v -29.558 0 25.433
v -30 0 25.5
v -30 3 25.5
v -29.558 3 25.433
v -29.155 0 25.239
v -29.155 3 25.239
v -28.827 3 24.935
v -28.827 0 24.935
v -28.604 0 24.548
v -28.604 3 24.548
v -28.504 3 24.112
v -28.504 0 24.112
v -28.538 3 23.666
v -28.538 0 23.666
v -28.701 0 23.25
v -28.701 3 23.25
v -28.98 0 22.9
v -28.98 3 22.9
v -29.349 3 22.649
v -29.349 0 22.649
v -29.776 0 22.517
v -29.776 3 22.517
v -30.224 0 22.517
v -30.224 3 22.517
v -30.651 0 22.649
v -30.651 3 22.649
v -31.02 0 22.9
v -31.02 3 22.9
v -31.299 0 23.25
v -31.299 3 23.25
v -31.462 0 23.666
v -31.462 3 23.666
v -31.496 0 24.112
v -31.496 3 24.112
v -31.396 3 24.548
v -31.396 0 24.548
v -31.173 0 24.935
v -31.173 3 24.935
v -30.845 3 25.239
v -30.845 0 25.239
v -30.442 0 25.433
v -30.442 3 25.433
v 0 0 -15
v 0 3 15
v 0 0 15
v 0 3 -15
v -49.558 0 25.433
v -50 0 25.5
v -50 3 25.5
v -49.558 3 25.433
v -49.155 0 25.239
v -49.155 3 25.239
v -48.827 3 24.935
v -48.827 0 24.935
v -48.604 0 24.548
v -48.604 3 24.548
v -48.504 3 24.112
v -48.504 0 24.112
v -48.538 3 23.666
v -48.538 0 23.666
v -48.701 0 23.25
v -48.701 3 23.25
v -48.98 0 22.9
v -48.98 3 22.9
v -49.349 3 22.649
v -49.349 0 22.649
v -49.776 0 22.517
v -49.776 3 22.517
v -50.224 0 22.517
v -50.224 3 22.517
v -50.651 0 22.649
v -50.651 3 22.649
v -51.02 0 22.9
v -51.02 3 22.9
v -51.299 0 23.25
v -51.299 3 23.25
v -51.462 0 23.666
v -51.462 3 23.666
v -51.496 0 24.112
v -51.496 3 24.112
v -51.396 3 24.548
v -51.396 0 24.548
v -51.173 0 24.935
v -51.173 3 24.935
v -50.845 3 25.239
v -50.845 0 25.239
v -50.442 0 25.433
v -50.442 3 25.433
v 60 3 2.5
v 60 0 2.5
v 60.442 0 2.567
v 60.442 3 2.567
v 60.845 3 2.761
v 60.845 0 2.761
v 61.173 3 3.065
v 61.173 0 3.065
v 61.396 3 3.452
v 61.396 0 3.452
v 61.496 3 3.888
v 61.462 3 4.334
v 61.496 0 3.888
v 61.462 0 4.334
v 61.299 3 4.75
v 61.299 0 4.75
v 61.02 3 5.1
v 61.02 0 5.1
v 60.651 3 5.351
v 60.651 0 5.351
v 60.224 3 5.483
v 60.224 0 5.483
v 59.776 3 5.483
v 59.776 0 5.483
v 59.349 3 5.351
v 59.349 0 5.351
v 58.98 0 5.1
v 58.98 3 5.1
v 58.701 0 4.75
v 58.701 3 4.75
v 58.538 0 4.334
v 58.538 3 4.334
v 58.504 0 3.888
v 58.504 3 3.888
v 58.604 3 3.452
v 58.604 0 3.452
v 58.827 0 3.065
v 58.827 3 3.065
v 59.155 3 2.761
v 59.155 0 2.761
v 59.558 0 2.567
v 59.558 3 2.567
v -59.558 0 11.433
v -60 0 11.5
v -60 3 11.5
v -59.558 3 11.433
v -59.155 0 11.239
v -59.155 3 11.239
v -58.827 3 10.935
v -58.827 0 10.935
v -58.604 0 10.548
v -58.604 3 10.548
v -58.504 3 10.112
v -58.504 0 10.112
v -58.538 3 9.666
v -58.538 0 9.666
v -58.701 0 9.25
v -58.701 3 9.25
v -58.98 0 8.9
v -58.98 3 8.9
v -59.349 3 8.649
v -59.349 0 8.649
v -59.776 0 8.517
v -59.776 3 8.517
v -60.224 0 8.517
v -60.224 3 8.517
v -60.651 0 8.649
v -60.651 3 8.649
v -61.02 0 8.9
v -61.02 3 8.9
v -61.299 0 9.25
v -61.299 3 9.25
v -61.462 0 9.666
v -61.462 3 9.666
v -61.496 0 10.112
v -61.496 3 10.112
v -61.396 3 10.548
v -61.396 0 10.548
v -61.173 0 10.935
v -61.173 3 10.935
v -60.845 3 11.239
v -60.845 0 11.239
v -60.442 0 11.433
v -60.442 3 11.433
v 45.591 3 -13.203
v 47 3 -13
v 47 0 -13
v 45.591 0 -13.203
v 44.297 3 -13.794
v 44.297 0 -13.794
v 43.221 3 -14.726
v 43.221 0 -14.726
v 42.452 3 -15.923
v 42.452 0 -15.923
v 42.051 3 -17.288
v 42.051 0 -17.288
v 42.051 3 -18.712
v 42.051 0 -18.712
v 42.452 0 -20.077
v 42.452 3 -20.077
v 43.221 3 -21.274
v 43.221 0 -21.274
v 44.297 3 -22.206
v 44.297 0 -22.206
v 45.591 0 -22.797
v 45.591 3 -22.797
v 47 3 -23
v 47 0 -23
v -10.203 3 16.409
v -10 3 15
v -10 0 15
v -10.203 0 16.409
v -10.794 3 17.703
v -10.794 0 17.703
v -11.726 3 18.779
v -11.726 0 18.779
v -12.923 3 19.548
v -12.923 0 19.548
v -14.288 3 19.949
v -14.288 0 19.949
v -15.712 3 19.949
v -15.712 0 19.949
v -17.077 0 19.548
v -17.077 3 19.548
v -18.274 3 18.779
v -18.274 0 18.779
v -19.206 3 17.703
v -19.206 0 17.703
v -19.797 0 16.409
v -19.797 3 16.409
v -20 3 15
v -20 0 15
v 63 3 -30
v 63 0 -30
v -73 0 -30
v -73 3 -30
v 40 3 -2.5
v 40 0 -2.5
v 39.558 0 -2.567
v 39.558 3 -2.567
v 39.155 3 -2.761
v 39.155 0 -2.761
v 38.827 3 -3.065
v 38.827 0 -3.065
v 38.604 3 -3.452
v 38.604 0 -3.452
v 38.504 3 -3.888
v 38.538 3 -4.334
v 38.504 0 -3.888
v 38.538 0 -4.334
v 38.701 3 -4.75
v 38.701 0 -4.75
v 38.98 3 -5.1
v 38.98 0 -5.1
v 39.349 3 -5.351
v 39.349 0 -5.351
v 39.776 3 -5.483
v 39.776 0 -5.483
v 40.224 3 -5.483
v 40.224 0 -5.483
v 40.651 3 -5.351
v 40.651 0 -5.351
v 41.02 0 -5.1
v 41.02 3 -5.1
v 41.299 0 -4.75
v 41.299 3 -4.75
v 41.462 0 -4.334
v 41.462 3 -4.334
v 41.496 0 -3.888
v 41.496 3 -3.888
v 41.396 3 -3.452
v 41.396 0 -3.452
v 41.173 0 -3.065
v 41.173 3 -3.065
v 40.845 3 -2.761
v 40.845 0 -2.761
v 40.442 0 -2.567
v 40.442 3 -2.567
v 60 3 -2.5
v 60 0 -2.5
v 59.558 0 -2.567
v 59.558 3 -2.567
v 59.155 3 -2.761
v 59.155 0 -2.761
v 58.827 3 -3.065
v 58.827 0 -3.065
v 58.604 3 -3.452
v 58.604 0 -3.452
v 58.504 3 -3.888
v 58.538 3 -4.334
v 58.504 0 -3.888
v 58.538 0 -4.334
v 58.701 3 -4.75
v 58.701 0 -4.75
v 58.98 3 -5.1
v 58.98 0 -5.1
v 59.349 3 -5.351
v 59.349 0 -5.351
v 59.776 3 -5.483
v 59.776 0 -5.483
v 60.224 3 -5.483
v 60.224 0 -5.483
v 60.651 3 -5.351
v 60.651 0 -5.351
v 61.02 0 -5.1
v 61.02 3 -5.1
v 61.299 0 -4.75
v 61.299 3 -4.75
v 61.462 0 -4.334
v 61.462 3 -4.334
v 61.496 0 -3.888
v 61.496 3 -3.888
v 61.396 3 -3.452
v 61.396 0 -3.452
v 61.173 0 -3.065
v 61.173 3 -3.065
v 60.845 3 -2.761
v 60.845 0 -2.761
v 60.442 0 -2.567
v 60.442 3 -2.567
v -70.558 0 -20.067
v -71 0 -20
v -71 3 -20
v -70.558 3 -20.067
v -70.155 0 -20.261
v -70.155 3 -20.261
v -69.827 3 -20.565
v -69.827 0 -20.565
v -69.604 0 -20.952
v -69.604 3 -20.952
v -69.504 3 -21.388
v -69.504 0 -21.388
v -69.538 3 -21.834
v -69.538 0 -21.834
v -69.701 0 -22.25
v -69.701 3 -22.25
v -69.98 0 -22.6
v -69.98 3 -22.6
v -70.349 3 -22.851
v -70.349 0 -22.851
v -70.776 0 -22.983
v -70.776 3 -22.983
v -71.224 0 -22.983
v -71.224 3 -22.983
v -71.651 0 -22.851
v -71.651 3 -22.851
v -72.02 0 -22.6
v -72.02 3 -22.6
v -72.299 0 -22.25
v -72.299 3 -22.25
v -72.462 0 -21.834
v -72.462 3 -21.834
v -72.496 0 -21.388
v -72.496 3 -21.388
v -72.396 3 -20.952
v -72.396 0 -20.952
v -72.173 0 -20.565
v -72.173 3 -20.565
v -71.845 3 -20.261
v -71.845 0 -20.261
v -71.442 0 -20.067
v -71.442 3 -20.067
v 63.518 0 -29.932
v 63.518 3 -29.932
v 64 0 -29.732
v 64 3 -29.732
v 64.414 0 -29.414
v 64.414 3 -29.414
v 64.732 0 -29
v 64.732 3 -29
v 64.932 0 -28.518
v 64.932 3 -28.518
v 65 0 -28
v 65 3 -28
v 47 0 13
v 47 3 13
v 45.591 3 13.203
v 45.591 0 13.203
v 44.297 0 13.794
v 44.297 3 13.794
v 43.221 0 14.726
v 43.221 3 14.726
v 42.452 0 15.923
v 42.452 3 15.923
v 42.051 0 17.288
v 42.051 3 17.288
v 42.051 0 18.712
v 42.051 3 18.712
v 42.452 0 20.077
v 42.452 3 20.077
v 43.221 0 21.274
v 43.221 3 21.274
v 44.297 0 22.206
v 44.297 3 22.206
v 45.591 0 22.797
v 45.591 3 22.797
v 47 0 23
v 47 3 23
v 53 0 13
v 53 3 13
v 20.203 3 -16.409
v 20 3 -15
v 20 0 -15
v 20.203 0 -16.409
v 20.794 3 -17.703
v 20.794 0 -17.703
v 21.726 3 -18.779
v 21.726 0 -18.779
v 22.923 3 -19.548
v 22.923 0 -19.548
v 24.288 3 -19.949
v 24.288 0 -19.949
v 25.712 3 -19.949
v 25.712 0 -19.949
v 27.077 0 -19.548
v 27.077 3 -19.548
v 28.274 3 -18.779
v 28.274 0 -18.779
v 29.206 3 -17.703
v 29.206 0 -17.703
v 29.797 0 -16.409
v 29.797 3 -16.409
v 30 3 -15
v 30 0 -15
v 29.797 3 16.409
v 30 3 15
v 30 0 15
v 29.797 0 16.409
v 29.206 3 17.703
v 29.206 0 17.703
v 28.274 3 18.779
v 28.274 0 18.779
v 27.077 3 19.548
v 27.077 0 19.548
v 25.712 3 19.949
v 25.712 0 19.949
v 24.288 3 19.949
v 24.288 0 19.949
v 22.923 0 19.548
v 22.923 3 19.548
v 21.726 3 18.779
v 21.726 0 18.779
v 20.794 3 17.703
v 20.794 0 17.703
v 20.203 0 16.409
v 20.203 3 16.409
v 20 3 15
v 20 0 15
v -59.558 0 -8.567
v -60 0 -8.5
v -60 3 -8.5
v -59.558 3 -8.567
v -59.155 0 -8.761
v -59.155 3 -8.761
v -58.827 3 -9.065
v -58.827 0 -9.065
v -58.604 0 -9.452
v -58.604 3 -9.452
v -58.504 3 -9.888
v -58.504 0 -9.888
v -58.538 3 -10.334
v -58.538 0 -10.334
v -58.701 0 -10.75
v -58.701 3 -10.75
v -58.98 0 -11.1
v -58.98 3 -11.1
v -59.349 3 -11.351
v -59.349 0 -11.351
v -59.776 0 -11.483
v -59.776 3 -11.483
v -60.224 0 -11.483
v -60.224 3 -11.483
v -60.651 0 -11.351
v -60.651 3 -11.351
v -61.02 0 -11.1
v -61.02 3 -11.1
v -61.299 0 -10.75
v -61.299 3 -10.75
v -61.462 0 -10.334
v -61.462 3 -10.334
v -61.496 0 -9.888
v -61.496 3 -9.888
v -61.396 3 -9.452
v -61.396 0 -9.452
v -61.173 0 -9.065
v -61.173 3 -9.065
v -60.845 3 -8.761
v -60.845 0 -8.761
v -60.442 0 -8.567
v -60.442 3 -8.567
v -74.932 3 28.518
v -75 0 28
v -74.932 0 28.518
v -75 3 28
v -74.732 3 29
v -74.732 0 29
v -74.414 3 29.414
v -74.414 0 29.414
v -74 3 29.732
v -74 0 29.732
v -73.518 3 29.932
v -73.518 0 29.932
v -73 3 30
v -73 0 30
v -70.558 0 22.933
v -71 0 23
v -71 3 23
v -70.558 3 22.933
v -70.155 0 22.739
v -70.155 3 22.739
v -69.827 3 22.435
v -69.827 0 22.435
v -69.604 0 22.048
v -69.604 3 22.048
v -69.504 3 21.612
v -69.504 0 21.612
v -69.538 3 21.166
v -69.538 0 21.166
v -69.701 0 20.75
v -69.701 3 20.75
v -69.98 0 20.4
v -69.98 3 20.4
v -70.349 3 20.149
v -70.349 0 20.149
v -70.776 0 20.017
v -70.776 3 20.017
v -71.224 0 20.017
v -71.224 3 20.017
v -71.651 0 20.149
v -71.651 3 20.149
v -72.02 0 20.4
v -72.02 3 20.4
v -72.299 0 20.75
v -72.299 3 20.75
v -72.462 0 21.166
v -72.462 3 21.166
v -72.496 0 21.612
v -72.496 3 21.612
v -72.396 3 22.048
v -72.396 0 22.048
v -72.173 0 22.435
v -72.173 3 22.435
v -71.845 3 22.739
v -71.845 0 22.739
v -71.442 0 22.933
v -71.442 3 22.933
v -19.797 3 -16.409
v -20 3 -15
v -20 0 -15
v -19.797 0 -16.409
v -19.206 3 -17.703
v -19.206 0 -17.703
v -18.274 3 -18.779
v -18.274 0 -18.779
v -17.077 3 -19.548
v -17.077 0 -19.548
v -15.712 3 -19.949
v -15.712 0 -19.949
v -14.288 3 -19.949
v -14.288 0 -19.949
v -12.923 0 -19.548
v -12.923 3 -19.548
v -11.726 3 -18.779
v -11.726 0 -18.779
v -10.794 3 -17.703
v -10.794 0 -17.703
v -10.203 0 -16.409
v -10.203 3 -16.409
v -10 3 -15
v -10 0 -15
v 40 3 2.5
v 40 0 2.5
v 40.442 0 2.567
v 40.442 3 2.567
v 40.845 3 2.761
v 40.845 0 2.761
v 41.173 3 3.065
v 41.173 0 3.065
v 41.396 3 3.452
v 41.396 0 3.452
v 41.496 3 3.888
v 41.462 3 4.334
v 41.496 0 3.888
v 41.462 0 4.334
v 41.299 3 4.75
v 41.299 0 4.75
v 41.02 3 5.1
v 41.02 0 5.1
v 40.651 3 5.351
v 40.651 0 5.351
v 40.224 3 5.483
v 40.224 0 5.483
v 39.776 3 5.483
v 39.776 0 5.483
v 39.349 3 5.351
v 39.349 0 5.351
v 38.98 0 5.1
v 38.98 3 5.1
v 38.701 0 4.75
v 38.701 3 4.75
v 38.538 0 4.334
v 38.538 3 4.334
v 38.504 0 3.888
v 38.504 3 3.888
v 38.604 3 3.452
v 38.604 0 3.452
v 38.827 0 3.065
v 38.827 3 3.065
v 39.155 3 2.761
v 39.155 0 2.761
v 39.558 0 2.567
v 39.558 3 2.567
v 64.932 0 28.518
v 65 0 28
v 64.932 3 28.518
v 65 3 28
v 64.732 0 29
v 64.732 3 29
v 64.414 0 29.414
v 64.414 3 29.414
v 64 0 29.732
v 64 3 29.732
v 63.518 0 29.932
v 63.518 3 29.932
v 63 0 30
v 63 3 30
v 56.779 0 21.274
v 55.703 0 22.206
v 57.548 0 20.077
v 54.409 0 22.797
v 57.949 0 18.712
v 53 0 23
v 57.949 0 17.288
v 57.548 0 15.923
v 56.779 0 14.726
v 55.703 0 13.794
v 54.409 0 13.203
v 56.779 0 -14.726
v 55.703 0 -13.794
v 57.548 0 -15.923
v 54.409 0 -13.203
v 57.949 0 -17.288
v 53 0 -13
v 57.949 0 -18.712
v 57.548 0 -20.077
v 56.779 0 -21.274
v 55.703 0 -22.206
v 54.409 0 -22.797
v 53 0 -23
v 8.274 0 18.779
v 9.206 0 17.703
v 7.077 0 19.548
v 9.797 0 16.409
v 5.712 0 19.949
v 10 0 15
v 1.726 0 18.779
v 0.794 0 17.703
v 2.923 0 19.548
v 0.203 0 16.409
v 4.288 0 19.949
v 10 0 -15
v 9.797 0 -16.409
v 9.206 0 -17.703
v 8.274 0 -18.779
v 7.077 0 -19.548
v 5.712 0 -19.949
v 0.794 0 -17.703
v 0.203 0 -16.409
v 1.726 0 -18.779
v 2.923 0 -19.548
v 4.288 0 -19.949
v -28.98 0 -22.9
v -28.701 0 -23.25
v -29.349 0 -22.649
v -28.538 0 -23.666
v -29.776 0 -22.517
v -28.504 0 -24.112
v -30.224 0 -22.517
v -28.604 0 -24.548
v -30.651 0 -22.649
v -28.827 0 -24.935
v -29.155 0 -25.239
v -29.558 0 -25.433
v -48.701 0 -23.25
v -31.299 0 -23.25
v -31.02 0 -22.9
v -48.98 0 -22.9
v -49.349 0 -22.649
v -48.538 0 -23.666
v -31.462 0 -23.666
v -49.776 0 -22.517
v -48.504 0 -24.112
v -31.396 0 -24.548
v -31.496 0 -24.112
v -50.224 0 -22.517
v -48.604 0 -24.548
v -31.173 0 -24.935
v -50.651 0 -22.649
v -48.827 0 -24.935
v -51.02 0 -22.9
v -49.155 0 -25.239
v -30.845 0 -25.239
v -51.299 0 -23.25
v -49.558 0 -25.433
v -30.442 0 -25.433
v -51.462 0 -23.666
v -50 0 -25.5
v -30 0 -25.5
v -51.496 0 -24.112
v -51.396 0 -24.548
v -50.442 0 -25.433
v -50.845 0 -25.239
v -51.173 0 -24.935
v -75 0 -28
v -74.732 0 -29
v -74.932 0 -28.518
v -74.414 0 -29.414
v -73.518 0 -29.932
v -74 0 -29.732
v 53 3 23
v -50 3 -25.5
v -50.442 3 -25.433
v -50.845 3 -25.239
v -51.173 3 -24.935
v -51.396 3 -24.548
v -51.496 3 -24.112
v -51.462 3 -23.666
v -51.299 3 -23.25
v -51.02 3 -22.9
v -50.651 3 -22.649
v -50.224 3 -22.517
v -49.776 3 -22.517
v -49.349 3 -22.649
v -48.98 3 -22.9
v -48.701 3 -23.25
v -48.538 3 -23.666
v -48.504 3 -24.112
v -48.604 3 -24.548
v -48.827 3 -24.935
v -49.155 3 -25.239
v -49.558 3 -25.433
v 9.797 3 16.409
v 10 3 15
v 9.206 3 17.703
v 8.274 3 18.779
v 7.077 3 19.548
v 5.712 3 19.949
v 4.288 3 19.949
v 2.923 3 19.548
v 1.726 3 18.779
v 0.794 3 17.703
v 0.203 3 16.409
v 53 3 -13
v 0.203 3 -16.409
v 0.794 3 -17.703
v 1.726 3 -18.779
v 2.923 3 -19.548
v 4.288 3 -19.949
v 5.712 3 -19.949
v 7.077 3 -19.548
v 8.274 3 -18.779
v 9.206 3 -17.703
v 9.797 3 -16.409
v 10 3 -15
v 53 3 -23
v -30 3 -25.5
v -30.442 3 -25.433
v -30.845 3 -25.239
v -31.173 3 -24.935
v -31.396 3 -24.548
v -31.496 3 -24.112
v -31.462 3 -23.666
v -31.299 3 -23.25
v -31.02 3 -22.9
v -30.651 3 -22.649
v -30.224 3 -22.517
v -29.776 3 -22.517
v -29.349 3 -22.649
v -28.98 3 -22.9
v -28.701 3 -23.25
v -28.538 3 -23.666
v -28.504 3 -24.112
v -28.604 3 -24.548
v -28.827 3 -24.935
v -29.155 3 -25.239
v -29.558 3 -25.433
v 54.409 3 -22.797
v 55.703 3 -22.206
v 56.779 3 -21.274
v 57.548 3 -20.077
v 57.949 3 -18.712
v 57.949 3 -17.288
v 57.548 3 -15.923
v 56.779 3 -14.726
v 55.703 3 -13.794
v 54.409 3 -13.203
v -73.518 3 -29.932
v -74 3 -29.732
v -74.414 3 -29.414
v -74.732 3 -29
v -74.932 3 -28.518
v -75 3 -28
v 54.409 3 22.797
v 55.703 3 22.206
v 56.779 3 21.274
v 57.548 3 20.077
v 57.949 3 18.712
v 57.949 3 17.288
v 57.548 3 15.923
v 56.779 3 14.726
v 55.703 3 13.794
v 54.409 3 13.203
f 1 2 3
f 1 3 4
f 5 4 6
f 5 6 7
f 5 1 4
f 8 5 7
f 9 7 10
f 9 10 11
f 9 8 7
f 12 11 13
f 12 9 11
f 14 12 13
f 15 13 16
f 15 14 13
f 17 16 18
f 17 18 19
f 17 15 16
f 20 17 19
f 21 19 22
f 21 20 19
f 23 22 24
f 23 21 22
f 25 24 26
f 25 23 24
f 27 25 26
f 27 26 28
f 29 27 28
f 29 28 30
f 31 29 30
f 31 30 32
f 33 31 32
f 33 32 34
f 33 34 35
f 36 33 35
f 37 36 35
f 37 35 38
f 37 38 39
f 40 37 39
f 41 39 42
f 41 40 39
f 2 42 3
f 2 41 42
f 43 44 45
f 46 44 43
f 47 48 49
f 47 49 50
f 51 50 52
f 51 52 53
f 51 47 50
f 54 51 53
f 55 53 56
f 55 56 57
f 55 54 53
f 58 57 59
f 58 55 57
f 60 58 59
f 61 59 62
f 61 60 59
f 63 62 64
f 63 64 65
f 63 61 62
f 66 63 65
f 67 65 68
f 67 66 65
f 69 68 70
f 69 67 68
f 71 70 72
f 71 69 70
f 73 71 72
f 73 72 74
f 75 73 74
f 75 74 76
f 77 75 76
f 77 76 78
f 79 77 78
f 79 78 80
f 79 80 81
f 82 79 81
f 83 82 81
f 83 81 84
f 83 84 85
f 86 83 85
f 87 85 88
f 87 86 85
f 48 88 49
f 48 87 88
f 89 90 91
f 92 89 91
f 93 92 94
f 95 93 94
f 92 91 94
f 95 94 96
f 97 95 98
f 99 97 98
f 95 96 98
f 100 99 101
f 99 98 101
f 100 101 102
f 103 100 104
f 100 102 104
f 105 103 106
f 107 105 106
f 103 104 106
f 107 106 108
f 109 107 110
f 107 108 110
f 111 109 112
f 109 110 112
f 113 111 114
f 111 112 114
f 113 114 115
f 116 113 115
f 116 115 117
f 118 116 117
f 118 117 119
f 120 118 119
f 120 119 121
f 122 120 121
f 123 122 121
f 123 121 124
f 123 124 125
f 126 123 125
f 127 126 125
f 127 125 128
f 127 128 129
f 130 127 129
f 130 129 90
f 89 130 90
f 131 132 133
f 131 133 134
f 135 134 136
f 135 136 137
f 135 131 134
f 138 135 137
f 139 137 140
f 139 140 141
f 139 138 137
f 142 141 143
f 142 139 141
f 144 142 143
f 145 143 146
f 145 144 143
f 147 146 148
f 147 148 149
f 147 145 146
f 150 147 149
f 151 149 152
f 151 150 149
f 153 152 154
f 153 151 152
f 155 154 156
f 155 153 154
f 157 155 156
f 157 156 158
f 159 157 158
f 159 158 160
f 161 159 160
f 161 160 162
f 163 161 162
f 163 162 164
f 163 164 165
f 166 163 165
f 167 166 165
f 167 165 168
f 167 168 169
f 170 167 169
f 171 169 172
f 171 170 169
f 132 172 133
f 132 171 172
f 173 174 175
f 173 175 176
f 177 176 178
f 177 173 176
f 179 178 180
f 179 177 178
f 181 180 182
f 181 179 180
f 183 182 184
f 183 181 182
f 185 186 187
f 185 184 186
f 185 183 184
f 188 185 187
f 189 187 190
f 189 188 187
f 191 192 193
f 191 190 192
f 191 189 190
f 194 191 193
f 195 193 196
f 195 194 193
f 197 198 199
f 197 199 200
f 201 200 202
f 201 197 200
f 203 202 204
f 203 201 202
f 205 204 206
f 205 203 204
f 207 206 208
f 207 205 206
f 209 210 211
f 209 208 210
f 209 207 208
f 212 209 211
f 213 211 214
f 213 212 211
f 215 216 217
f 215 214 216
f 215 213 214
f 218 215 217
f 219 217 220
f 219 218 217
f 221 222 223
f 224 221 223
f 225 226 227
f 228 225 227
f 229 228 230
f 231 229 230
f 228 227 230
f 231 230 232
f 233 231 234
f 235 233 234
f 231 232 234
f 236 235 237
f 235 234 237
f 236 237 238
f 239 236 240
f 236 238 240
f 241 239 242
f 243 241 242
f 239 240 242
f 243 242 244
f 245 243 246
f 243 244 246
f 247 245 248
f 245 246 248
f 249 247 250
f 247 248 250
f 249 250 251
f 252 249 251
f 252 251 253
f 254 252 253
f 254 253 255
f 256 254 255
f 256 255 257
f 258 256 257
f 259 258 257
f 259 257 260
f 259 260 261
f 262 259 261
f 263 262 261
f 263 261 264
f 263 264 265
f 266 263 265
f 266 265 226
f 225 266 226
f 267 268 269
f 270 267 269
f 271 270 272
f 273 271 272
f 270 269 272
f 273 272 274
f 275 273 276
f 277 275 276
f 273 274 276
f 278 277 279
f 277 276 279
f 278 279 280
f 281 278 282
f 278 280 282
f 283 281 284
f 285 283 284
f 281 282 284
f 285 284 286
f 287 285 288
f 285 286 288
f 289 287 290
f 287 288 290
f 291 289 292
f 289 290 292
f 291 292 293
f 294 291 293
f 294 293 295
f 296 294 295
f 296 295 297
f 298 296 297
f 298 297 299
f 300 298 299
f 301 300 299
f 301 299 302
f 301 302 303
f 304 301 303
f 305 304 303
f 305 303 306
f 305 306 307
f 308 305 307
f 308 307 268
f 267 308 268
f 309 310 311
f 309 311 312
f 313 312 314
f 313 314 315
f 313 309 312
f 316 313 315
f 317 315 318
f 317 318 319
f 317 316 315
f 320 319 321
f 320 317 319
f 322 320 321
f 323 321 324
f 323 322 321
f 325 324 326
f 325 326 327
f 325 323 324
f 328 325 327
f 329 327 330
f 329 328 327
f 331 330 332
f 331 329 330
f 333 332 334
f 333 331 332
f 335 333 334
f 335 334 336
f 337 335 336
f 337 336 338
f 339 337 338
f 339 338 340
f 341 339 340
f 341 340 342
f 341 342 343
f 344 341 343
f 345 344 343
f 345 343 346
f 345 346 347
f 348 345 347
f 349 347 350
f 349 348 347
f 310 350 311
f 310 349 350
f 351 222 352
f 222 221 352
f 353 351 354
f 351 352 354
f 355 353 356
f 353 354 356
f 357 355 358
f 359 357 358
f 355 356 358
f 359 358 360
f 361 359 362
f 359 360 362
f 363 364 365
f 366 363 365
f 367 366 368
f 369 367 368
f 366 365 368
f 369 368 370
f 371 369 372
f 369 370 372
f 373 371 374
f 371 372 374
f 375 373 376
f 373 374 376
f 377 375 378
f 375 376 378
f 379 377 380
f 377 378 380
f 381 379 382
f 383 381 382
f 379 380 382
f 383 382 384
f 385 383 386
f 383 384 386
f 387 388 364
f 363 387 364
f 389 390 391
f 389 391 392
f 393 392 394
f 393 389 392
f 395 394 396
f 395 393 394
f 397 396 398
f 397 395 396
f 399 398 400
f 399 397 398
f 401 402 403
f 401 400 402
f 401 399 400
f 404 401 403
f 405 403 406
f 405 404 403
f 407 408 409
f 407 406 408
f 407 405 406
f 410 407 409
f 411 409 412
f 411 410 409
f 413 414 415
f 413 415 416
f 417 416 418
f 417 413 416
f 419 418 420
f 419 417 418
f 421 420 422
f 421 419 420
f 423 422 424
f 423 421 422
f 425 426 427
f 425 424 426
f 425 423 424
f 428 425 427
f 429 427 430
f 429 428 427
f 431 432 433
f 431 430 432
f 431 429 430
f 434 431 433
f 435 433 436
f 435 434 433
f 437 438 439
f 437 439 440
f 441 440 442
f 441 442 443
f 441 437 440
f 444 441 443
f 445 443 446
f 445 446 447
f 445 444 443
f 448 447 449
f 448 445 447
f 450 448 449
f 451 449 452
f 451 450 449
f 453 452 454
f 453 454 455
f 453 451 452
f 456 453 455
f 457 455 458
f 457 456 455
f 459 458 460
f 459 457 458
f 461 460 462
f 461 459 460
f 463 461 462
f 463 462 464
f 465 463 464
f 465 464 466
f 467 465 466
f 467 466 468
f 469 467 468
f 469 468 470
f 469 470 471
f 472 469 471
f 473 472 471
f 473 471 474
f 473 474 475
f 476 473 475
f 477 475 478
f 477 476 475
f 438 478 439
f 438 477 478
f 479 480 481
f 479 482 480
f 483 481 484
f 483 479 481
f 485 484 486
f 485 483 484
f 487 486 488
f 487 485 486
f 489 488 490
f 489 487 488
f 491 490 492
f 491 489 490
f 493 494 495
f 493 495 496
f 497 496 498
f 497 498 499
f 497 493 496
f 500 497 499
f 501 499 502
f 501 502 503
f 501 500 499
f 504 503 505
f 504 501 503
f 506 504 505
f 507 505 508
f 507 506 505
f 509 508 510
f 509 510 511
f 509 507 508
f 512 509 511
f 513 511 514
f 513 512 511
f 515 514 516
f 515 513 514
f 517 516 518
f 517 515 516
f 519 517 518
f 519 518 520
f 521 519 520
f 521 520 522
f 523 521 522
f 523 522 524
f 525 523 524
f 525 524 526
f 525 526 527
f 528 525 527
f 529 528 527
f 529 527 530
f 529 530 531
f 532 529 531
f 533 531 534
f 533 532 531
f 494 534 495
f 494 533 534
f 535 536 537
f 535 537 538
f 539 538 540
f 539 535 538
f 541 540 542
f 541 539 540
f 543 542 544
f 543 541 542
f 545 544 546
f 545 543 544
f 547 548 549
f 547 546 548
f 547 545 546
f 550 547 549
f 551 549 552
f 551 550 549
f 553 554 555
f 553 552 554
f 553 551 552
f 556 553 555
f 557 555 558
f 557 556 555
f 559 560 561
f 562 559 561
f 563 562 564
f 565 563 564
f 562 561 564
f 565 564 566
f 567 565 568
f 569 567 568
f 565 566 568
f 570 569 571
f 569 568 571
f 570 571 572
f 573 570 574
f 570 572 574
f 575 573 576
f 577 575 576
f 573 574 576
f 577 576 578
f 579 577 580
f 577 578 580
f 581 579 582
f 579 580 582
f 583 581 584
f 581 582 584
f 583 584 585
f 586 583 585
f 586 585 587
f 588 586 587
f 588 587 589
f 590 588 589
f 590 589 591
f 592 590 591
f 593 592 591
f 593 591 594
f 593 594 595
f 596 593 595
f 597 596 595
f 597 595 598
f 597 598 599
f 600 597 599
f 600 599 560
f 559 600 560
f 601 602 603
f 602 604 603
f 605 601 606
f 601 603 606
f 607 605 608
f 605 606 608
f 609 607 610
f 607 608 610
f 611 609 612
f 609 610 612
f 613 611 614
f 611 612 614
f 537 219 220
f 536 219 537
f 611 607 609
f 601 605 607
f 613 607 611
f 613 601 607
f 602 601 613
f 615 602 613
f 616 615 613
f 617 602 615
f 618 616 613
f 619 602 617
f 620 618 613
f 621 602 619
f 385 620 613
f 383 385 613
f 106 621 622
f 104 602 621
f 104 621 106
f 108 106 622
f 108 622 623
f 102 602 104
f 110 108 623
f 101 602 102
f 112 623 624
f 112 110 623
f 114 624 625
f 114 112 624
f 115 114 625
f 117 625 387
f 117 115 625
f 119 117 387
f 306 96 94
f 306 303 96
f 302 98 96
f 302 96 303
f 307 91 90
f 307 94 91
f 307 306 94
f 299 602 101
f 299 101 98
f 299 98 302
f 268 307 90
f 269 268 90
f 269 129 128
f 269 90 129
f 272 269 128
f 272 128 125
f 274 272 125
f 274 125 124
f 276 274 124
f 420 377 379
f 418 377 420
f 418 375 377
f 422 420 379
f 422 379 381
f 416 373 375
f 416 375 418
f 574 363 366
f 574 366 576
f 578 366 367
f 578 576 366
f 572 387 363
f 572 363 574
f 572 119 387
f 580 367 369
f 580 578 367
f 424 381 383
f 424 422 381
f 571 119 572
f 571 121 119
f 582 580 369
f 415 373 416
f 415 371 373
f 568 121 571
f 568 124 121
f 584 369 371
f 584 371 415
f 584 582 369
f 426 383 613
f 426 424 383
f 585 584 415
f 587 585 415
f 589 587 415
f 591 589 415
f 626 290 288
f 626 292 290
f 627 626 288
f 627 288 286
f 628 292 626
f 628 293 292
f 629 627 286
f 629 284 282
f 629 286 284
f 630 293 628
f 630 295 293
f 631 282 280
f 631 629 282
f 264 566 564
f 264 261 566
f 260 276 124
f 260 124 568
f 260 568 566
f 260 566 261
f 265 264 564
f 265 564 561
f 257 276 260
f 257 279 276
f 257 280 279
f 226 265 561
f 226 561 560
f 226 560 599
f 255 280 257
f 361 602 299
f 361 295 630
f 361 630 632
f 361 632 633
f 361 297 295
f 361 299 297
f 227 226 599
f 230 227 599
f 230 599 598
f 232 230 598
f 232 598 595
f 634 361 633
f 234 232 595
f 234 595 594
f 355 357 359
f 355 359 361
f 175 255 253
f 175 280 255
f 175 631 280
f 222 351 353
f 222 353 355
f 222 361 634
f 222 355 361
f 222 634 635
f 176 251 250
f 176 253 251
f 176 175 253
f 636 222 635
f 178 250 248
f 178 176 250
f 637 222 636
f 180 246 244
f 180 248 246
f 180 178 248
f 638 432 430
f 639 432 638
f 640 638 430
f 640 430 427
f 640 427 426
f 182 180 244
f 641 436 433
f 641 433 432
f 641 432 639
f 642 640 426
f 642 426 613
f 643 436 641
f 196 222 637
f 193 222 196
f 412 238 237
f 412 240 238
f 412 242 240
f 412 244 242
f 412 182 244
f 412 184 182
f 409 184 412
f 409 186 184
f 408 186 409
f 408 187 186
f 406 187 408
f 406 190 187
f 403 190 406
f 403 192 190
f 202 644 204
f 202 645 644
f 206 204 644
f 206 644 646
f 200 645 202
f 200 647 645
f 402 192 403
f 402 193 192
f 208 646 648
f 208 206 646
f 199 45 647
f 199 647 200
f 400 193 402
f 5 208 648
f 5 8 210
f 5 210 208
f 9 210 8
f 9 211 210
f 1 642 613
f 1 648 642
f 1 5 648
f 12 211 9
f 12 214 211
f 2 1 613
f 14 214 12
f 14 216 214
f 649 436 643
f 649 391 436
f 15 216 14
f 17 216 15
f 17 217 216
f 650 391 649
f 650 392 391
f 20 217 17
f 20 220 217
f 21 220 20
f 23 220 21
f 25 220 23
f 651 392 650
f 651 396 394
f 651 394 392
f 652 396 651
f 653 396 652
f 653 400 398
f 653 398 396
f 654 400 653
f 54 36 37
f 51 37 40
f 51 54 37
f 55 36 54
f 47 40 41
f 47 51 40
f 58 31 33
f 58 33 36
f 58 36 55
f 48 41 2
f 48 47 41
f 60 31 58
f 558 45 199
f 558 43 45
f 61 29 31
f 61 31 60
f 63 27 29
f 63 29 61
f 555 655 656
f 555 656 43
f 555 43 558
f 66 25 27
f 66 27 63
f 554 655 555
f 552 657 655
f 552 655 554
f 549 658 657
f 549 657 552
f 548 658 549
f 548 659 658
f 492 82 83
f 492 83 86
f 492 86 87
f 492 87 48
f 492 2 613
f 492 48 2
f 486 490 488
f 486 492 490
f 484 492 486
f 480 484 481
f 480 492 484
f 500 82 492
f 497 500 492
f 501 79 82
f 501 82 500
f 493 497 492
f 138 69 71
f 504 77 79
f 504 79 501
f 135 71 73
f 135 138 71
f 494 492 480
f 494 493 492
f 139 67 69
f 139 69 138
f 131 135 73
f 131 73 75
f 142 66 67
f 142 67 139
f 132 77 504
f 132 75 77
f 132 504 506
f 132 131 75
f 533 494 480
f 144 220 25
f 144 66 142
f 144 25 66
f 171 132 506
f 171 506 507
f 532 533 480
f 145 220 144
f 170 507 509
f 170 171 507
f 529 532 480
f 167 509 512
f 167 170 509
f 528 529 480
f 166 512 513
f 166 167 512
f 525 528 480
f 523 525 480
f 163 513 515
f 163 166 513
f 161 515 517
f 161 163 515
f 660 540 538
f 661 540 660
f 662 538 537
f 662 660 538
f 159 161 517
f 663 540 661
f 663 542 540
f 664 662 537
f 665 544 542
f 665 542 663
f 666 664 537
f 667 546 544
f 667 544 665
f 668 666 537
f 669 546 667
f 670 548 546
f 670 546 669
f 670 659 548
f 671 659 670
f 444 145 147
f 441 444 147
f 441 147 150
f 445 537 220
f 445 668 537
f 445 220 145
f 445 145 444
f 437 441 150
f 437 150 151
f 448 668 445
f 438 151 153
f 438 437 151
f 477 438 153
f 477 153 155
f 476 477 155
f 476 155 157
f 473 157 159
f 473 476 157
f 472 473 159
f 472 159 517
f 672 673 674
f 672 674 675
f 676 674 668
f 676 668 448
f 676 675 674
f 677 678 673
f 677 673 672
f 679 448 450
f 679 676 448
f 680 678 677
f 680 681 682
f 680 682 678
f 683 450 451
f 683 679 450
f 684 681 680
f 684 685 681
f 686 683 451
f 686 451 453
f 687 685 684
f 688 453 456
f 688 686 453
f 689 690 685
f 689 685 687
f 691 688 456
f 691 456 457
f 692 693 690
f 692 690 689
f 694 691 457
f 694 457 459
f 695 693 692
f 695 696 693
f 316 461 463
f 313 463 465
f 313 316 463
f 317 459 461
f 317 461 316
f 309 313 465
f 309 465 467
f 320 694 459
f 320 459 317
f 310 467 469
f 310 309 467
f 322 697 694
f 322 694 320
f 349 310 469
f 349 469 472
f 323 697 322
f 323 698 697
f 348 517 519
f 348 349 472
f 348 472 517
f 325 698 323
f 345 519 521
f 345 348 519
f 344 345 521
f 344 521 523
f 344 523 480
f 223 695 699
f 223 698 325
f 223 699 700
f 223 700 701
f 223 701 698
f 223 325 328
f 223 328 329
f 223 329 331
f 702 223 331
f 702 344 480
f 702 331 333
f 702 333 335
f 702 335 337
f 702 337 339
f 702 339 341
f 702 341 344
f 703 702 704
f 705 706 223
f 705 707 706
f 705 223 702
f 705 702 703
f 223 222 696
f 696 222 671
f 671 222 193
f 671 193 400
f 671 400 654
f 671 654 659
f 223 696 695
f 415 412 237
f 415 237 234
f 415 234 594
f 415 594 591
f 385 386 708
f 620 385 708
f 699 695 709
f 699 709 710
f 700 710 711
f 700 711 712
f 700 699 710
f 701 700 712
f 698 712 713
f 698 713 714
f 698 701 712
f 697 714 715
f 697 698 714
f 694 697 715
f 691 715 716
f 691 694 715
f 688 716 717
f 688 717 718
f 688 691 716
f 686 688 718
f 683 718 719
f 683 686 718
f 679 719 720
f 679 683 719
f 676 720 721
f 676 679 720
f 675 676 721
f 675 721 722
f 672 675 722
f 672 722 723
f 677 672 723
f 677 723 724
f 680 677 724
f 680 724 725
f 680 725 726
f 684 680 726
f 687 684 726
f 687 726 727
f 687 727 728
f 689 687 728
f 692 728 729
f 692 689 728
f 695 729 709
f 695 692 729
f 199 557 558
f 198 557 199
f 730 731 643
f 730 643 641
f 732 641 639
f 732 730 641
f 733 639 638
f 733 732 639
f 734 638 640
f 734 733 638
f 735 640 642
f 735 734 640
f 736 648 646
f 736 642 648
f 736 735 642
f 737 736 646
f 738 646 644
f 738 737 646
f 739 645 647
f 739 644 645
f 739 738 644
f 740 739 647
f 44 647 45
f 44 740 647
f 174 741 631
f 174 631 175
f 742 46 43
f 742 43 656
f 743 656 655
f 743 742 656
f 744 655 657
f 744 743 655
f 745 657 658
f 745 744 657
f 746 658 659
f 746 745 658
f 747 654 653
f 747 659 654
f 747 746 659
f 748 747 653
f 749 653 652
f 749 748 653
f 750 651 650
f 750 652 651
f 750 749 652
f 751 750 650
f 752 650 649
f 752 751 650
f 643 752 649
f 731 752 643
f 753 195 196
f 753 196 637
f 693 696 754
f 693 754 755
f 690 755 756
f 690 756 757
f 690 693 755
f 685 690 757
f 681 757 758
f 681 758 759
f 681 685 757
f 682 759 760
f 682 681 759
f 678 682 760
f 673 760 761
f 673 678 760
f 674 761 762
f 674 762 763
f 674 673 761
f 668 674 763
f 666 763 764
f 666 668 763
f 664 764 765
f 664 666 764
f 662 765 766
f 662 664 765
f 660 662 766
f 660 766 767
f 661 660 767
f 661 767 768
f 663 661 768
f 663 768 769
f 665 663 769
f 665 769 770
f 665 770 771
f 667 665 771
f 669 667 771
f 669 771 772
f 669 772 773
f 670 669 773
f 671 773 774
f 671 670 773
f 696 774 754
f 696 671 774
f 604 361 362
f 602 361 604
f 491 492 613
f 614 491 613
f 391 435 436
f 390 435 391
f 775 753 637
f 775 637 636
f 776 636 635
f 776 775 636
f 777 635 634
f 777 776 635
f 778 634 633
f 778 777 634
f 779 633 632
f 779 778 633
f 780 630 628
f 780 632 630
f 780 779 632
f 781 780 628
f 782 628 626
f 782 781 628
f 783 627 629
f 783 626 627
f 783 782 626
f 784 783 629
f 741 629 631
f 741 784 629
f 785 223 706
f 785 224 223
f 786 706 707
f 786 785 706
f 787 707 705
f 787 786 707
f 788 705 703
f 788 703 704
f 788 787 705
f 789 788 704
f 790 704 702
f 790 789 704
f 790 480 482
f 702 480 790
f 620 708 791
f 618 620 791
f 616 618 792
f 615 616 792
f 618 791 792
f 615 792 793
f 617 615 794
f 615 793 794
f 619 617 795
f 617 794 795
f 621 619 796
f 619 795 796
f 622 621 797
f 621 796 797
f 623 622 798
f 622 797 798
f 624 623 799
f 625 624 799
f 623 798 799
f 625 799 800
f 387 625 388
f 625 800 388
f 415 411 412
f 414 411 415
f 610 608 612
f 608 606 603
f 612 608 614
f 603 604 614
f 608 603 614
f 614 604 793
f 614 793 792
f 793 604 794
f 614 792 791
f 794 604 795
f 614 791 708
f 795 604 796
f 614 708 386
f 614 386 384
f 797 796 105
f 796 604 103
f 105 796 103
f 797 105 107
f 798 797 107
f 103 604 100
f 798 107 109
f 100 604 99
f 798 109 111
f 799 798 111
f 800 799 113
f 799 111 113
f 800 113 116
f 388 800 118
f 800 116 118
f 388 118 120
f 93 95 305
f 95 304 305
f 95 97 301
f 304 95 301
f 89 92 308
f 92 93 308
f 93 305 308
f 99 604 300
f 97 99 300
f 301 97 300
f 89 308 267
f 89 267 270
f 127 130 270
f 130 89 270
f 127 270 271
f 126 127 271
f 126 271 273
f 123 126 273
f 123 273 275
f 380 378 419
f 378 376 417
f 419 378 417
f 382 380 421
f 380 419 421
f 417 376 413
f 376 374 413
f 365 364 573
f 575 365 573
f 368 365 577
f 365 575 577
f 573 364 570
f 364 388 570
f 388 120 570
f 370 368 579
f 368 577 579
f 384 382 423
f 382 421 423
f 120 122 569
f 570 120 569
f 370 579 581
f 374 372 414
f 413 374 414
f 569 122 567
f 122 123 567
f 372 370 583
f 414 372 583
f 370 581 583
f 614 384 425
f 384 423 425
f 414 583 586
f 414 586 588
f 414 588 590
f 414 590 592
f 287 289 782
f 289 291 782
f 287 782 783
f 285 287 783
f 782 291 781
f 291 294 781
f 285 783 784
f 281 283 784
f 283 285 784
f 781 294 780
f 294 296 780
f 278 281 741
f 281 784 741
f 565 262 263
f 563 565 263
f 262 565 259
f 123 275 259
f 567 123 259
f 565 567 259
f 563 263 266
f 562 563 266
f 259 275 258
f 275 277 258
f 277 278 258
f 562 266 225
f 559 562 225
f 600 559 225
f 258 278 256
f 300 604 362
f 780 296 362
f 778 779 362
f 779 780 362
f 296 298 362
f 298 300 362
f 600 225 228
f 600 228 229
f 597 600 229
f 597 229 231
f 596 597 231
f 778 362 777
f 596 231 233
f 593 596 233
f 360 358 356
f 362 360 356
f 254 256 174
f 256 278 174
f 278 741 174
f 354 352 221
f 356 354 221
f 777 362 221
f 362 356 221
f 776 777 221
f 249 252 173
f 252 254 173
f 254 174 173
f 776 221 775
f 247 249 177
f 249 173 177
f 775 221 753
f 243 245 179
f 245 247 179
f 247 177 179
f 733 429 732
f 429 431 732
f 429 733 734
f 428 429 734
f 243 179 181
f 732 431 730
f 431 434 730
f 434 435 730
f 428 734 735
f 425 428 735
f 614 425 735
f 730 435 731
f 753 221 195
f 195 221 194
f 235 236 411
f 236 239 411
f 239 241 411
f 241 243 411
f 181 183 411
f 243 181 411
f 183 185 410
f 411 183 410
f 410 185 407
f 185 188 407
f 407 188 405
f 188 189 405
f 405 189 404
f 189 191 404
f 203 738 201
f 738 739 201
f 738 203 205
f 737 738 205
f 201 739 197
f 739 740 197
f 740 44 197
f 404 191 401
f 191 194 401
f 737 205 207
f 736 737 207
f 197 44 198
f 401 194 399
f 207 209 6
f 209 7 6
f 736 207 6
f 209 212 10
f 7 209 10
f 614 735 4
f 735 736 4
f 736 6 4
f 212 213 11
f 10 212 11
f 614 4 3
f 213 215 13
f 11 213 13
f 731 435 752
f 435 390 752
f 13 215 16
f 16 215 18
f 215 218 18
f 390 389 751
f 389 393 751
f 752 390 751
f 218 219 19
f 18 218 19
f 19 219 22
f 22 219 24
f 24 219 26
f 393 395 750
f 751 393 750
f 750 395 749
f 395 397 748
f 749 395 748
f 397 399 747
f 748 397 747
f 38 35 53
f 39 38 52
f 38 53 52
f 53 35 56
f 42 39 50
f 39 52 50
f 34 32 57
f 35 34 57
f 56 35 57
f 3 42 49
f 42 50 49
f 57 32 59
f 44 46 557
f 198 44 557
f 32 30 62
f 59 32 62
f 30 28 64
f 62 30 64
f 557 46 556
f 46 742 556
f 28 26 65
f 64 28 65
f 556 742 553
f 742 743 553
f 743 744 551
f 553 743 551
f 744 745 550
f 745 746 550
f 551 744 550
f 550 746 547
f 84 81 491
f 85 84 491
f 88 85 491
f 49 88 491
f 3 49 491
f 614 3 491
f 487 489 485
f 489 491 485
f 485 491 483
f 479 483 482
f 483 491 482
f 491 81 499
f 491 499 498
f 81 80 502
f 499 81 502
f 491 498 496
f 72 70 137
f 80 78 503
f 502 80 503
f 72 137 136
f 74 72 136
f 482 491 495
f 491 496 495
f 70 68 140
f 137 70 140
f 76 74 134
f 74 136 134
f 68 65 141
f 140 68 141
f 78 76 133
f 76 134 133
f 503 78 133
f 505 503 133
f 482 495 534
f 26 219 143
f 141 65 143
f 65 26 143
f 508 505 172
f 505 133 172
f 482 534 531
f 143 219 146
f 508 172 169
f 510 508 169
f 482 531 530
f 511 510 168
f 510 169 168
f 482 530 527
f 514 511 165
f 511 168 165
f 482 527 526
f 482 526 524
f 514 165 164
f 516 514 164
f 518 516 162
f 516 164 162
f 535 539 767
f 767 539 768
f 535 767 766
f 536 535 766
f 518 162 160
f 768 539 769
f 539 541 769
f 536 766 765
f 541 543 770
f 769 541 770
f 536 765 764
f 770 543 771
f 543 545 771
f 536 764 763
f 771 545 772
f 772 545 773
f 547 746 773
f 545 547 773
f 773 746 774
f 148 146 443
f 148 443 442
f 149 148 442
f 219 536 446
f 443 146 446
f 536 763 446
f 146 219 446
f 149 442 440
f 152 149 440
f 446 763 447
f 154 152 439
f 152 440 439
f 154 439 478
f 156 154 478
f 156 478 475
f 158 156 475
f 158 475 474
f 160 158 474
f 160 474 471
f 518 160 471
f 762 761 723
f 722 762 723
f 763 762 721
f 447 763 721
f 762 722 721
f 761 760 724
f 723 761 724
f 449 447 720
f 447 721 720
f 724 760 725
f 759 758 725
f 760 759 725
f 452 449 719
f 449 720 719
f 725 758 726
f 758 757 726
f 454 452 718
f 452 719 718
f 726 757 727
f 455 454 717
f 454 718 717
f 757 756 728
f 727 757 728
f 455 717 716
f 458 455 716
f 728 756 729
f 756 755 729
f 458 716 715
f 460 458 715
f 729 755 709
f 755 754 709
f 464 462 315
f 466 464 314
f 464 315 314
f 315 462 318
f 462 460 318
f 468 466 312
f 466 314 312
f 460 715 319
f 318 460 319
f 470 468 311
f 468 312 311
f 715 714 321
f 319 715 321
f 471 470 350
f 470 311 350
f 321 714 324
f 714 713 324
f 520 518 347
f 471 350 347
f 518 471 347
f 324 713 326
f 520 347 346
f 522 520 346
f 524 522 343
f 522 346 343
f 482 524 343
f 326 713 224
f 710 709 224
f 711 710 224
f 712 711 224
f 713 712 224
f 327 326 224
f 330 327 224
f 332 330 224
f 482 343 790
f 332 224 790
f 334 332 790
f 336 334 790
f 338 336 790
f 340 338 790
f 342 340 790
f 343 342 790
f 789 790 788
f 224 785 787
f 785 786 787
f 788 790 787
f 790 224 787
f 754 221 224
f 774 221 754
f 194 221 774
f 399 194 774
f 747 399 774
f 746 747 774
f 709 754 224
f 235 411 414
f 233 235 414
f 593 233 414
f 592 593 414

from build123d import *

# Parameters (mm, degrees)
SKETCH_1_R          = 1.5
EXTRUDE_1_DEPTH     = 3
SKETCH_3_R          = 1.5
CUT_EXTRUDE_1_DEPTH = 81.833161512
CUT_EXTRUDE_2_DEPTH = 81.833161512
FILLET_1_R          = 2


with BuildPart() as part:
    # 草图1 → 凸台-拉伸1 (new body)
    with BuildSketch(Plane(origin=(0, 0, 0), x_dir=(1, 0, 0), z_dir=(0, 1, 0))):
        Polygon((-65, 30), (65, 30), (65, -30), (-65, -30), (-75, -30), (-75, 30), align=None)
        with Locations(Location((-60, 10, 0), (0, 0, 270))):
            Circle(SKETCH_1_R, mode=Mode.SUBTRACT)
        with Locations(Location((-60, -10, 0), (0, 0, 270))):
            Circle(SKETCH_1_R, mode=Mode.SUBTRACT)
        with Locations(Location((-50, -24, 0), (0, 0, 270))):
            Circle(SKETCH_1_R, mode=Mode.SUBTRACT)
        with Locations(Location((-30, -24, 0), (0, 0, 270))):
            Circle(SKETCH_1_R, mode=Mode.SUBTRACT)
        with Locations(Location((-30, 24, 0), (0, 0, 90))):
            Circle(SKETCH_1_R, mode=Mode.SUBTRACT)
        with Locations(Location((-50, 24, 0), (0, 0, 90))):
            Circle(SKETCH_1_R, mode=Mode.SUBTRACT)
        with Locations(Location((-71, 21.5, 0), (0, 0, 270))):
            Circle(SKETCH_1_R, mode=Mode.SUBTRACT)
        with Locations(Location((-71, -21.5, 0), (0, 0, 270))):
            Circle(SKETCH_1_R, mode=Mode.SUBTRACT)
    extrude(amount=EXTRUDE_1_DEPTH)

    # 草图3 → 切除-拉伸1 (cut, through all)
    with BuildSketch(Plane.XZ):
        with Locations(Location((40, 4, 0), (0, 0, 270))):
            Circle(SKETCH_3_R)
        with Locations(Location((60, 4, 0), (0, 0, 270))):
            Circle(SKETCH_3_R)
        with Locations(Location((60, -4, 0), (0, 0, 90))):
            Circle(SKETCH_3_R)
        with Locations(Location((40, -4, 0), (0, 0, 90))):
            Circle(SKETCH_3_R)
    extrude(amount=-CUT_EXTRUDE_1_DEPTH, mode=Mode.SUBTRACT)

    # 草图4 → 切除-拉伸2 (cut, through all)
    with BuildSketch(Plane(origin=(0, 3, 0), x_dir=(1, 0, 0), z_dir=(0, 1, 0))):
        with BuildLine():
            Line((-10, 15), (-10, -15))
            ThreePointArc((-10, -15), (-15, -20), (-20, -15))
            Line((-20, -15), (-20, 15))
            ThreePointArc((-20, 15), (-15, 20), (-10, 15))
        make_face()
        with BuildLine():
            Line((10, 15), (10, -15))
            ThreePointArc((10, -15), (5, -20), (0, -15))
            Line((0, -15), (0, 15))
            ThreePointArc((0, 15), (5, 20), (10, 15))
        make_face()
        with BuildLine():
            Line((30, 15), (30, -15))
            ThreePointArc((30, -15), (25, -20), (20, -15))
            Line((20, -15), (20, 15))
            ThreePointArc((20, 15), (25, 20), (30, 15))
        make_face()
        with BuildLine():
            Line((47, 23), (53, 23))
            ThreePointArc((53, 23), (58, 18), (53, 13))
            Line((53, 13), (47, 13))
            ThreePointArc((47, 13), (42, 18), (47, 23))
        make_face()
        with BuildLine():
            Line((47, -23), (53, -23))
            ThreePointArc((53, -23), (58, -18), (53, -13))
            Line((53, -13), (47, -13))
            ThreePointArc((47, -13), (42, -18), (47, -23))
        make_face()
    extrude(amount=-CUT_EXTRUDE_2_DEPTH, mode=Mode.SUBTRACT)

    # 圆角1
    fillet_1_edges = [part.edges().sort_by_distance(p)[0] for p in [
        (65, 1.5, 30),
        (-75, 1.5, 30),
        (-75, 1.5, -30),
        (65, 1.5, -30),
    ]]
    fillet(fillet_1_edges, radius=FILLET_1_R)


solid = part.part
